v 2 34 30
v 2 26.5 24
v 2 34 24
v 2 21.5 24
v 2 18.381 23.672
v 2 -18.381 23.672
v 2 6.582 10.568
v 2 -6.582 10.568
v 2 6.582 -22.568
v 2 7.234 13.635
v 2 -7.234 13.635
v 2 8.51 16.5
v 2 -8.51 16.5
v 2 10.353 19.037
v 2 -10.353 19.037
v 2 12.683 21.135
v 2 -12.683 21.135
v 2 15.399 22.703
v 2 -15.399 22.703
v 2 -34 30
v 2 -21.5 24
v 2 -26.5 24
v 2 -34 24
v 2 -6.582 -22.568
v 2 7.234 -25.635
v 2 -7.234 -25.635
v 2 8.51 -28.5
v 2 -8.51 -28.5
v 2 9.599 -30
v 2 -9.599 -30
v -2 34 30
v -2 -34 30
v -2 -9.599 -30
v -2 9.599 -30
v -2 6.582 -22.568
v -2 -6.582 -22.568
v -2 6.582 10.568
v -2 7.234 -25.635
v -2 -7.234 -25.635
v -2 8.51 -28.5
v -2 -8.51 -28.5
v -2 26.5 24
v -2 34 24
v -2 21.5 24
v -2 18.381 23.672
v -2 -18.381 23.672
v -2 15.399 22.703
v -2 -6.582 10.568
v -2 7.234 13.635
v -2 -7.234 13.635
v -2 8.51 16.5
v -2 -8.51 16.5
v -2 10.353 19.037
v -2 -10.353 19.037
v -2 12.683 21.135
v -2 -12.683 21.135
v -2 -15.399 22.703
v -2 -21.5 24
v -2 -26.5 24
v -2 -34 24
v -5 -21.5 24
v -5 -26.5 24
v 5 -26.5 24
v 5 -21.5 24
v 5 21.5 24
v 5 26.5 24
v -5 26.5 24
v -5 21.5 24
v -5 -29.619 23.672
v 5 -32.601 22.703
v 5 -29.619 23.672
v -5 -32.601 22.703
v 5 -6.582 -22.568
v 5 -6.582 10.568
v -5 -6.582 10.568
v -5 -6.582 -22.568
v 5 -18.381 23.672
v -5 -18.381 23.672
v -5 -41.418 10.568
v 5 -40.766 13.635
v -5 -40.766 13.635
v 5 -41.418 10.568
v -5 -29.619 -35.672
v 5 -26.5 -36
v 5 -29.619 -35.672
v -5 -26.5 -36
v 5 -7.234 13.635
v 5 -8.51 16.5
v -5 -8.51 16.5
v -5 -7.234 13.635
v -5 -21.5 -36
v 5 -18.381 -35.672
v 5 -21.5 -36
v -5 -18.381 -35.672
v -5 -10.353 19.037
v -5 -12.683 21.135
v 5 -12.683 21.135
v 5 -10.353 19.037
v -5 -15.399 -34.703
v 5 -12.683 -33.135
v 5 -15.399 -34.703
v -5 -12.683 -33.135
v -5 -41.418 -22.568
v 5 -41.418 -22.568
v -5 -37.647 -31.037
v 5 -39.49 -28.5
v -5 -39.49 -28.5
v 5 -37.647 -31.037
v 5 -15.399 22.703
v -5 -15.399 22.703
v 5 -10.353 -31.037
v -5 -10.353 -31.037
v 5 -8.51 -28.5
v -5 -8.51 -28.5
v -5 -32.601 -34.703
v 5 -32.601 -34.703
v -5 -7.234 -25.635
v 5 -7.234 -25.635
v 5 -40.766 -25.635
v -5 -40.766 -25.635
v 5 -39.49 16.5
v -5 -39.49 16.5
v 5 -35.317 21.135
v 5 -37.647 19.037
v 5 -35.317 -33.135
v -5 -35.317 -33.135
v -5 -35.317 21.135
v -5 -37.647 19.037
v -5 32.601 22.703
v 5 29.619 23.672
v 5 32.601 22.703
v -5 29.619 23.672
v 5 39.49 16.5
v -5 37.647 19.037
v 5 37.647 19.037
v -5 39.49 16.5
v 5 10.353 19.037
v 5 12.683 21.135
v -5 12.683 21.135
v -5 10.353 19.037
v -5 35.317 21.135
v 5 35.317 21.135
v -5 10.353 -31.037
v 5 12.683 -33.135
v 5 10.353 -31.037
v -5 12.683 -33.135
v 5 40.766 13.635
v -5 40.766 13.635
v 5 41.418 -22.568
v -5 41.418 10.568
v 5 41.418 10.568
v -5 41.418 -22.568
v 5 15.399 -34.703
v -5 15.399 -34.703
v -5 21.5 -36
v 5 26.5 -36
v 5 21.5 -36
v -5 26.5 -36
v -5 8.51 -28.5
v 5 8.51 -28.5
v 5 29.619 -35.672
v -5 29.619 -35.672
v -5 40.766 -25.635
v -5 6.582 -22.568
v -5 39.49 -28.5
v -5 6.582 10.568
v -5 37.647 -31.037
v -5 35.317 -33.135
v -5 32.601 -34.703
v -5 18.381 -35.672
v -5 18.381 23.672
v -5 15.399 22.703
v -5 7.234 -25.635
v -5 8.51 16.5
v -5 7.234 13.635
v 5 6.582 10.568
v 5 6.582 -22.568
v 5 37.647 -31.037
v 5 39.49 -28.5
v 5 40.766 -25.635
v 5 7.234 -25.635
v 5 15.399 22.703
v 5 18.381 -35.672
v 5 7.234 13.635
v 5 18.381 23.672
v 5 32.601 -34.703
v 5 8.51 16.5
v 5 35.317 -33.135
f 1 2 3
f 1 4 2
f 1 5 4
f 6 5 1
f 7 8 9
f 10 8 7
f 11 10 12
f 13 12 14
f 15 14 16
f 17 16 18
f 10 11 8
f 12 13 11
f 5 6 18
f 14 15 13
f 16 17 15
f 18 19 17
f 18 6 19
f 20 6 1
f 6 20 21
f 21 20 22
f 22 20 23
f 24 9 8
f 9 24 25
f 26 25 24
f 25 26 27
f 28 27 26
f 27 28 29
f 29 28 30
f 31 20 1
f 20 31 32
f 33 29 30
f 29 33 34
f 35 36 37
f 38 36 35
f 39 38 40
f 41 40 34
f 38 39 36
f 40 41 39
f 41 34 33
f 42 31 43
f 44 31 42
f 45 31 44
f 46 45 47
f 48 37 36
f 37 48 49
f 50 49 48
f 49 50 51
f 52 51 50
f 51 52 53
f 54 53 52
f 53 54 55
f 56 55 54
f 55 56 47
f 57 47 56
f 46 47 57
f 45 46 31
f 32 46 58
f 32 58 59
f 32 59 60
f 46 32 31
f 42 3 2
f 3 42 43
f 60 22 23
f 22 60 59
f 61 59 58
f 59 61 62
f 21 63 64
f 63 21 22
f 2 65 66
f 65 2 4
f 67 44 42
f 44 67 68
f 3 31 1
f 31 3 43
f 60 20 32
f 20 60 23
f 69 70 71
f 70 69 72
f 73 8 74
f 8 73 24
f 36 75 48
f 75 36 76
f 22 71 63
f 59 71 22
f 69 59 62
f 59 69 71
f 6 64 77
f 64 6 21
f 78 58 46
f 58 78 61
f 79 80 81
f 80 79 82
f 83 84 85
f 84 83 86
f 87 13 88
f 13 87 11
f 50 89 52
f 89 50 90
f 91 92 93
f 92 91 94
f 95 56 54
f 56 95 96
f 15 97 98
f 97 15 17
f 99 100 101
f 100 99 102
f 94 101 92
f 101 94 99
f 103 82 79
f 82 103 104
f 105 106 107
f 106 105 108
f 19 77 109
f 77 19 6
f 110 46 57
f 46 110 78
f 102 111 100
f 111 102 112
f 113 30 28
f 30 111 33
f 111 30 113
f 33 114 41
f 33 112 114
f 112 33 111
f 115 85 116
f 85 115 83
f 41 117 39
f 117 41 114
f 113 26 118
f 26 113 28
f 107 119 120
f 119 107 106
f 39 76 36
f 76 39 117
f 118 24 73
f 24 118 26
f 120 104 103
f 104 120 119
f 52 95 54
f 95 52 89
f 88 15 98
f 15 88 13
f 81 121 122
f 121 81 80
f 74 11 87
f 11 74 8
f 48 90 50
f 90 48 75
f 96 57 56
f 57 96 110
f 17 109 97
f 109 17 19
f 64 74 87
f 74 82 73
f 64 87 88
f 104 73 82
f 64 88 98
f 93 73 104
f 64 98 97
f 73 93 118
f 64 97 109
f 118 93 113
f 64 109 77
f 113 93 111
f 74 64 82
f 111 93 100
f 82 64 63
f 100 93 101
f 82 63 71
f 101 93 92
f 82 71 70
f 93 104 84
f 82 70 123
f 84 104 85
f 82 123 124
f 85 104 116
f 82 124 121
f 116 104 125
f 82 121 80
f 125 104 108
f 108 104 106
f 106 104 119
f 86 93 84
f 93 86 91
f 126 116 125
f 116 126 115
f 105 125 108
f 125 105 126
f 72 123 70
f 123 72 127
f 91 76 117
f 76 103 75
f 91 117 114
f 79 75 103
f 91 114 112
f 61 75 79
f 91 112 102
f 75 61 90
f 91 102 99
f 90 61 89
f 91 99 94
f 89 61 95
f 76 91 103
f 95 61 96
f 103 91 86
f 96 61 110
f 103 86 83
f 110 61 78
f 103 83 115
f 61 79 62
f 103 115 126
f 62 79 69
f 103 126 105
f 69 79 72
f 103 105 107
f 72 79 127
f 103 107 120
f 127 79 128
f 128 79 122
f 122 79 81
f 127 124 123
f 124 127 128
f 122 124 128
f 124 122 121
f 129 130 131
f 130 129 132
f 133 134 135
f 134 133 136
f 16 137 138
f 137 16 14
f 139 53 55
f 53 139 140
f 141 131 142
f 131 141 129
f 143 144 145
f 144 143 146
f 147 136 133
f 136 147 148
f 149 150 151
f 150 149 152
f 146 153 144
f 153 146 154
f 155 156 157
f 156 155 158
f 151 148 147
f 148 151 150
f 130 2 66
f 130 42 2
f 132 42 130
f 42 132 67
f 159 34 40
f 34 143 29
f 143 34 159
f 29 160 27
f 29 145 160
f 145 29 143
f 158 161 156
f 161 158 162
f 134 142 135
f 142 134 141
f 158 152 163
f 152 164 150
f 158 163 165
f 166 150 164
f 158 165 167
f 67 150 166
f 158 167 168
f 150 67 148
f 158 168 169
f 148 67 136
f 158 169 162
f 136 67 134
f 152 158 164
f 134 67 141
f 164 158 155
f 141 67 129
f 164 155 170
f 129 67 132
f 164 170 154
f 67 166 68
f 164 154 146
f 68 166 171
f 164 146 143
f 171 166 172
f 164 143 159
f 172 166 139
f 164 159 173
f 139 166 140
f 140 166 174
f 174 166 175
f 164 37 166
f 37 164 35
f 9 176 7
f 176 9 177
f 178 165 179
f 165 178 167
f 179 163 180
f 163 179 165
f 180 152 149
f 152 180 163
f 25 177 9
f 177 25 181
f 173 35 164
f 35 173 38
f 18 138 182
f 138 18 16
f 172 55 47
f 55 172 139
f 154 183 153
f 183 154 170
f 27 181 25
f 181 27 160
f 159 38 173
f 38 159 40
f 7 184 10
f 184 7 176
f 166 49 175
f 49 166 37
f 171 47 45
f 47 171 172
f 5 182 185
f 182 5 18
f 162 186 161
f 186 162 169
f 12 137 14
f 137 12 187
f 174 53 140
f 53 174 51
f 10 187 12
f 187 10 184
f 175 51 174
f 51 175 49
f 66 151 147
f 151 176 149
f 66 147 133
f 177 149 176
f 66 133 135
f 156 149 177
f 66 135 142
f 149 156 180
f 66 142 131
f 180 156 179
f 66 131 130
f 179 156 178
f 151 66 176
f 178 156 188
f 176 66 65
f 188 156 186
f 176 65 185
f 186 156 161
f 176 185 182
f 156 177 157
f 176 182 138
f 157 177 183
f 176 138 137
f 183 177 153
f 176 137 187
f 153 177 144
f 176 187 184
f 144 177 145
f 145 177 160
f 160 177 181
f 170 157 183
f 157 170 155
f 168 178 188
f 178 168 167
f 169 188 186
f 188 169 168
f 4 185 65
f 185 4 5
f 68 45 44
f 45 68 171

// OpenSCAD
// file: roundbox.scad
module roundedRectUp(size, radius)
{
    x = size[0];
    y = size[1];
    z = size[2];

    linear_extrude(height=z)
    hull()
    {
        // place 4 circles in the corners, with the given radius
        translate([(-x/2)+(radius/2), (-y/2)+(radius/2), 0])
        circle(r=radius);

        translate([(x/2)-(radius/2), (-y/2)+(radius/2), 0])
        circle(r=radius);

        translate([(-x/2)+(radius/2), (y/2)-(radius/2), 0])
        circle(r=radius);

        translate([(x/2)-(radius/2), (y/2)-(radius/2), 0])
        circle(r=radius);
    }
}

module roundedRect(size, radius, center=false) 
{
    if( center) {
        translate([ 0, 0, -size[2]/2])
        roundedRectUp(size, radius);
    }
    else {
        roundedRectUp(size, radius);
    }
}


// example
roundedRect([20, 10, 1], 3, true);
// main file
use <roundbox.scad>

  



difference() {
  union(){
    cube([4, 50, 60], center=true);
    translate([0, 0, 27])
    cube([4, 68, 6], center=true);
  }


/*
  translate([0, 30, 0]){
    scale([1, 0.8, 1]){
      rotate([0, 90, 0]){
        cylinder(r1=26, r2=26, h=4, center=true);
      }
    }
  }
  
  translate([0, -30, 0]){
    scale([1, 0.8, 1]){
      rotate([0, 90, 0]){
        cylinder(r1=26, r2=26, h=4, center=true);
      }
    }
  }*/
}
 
module hole1() {
color("red")    
translate([ 0, -24, -6])
rotate([ 0, 90, 0])
roundedRect([45, 10,  10], 15, true);
}

module copy_mirror(vec=[0,1,0])
{
    children();
    mirror(vec) children();
} 

copy_mirror()
hole1();
